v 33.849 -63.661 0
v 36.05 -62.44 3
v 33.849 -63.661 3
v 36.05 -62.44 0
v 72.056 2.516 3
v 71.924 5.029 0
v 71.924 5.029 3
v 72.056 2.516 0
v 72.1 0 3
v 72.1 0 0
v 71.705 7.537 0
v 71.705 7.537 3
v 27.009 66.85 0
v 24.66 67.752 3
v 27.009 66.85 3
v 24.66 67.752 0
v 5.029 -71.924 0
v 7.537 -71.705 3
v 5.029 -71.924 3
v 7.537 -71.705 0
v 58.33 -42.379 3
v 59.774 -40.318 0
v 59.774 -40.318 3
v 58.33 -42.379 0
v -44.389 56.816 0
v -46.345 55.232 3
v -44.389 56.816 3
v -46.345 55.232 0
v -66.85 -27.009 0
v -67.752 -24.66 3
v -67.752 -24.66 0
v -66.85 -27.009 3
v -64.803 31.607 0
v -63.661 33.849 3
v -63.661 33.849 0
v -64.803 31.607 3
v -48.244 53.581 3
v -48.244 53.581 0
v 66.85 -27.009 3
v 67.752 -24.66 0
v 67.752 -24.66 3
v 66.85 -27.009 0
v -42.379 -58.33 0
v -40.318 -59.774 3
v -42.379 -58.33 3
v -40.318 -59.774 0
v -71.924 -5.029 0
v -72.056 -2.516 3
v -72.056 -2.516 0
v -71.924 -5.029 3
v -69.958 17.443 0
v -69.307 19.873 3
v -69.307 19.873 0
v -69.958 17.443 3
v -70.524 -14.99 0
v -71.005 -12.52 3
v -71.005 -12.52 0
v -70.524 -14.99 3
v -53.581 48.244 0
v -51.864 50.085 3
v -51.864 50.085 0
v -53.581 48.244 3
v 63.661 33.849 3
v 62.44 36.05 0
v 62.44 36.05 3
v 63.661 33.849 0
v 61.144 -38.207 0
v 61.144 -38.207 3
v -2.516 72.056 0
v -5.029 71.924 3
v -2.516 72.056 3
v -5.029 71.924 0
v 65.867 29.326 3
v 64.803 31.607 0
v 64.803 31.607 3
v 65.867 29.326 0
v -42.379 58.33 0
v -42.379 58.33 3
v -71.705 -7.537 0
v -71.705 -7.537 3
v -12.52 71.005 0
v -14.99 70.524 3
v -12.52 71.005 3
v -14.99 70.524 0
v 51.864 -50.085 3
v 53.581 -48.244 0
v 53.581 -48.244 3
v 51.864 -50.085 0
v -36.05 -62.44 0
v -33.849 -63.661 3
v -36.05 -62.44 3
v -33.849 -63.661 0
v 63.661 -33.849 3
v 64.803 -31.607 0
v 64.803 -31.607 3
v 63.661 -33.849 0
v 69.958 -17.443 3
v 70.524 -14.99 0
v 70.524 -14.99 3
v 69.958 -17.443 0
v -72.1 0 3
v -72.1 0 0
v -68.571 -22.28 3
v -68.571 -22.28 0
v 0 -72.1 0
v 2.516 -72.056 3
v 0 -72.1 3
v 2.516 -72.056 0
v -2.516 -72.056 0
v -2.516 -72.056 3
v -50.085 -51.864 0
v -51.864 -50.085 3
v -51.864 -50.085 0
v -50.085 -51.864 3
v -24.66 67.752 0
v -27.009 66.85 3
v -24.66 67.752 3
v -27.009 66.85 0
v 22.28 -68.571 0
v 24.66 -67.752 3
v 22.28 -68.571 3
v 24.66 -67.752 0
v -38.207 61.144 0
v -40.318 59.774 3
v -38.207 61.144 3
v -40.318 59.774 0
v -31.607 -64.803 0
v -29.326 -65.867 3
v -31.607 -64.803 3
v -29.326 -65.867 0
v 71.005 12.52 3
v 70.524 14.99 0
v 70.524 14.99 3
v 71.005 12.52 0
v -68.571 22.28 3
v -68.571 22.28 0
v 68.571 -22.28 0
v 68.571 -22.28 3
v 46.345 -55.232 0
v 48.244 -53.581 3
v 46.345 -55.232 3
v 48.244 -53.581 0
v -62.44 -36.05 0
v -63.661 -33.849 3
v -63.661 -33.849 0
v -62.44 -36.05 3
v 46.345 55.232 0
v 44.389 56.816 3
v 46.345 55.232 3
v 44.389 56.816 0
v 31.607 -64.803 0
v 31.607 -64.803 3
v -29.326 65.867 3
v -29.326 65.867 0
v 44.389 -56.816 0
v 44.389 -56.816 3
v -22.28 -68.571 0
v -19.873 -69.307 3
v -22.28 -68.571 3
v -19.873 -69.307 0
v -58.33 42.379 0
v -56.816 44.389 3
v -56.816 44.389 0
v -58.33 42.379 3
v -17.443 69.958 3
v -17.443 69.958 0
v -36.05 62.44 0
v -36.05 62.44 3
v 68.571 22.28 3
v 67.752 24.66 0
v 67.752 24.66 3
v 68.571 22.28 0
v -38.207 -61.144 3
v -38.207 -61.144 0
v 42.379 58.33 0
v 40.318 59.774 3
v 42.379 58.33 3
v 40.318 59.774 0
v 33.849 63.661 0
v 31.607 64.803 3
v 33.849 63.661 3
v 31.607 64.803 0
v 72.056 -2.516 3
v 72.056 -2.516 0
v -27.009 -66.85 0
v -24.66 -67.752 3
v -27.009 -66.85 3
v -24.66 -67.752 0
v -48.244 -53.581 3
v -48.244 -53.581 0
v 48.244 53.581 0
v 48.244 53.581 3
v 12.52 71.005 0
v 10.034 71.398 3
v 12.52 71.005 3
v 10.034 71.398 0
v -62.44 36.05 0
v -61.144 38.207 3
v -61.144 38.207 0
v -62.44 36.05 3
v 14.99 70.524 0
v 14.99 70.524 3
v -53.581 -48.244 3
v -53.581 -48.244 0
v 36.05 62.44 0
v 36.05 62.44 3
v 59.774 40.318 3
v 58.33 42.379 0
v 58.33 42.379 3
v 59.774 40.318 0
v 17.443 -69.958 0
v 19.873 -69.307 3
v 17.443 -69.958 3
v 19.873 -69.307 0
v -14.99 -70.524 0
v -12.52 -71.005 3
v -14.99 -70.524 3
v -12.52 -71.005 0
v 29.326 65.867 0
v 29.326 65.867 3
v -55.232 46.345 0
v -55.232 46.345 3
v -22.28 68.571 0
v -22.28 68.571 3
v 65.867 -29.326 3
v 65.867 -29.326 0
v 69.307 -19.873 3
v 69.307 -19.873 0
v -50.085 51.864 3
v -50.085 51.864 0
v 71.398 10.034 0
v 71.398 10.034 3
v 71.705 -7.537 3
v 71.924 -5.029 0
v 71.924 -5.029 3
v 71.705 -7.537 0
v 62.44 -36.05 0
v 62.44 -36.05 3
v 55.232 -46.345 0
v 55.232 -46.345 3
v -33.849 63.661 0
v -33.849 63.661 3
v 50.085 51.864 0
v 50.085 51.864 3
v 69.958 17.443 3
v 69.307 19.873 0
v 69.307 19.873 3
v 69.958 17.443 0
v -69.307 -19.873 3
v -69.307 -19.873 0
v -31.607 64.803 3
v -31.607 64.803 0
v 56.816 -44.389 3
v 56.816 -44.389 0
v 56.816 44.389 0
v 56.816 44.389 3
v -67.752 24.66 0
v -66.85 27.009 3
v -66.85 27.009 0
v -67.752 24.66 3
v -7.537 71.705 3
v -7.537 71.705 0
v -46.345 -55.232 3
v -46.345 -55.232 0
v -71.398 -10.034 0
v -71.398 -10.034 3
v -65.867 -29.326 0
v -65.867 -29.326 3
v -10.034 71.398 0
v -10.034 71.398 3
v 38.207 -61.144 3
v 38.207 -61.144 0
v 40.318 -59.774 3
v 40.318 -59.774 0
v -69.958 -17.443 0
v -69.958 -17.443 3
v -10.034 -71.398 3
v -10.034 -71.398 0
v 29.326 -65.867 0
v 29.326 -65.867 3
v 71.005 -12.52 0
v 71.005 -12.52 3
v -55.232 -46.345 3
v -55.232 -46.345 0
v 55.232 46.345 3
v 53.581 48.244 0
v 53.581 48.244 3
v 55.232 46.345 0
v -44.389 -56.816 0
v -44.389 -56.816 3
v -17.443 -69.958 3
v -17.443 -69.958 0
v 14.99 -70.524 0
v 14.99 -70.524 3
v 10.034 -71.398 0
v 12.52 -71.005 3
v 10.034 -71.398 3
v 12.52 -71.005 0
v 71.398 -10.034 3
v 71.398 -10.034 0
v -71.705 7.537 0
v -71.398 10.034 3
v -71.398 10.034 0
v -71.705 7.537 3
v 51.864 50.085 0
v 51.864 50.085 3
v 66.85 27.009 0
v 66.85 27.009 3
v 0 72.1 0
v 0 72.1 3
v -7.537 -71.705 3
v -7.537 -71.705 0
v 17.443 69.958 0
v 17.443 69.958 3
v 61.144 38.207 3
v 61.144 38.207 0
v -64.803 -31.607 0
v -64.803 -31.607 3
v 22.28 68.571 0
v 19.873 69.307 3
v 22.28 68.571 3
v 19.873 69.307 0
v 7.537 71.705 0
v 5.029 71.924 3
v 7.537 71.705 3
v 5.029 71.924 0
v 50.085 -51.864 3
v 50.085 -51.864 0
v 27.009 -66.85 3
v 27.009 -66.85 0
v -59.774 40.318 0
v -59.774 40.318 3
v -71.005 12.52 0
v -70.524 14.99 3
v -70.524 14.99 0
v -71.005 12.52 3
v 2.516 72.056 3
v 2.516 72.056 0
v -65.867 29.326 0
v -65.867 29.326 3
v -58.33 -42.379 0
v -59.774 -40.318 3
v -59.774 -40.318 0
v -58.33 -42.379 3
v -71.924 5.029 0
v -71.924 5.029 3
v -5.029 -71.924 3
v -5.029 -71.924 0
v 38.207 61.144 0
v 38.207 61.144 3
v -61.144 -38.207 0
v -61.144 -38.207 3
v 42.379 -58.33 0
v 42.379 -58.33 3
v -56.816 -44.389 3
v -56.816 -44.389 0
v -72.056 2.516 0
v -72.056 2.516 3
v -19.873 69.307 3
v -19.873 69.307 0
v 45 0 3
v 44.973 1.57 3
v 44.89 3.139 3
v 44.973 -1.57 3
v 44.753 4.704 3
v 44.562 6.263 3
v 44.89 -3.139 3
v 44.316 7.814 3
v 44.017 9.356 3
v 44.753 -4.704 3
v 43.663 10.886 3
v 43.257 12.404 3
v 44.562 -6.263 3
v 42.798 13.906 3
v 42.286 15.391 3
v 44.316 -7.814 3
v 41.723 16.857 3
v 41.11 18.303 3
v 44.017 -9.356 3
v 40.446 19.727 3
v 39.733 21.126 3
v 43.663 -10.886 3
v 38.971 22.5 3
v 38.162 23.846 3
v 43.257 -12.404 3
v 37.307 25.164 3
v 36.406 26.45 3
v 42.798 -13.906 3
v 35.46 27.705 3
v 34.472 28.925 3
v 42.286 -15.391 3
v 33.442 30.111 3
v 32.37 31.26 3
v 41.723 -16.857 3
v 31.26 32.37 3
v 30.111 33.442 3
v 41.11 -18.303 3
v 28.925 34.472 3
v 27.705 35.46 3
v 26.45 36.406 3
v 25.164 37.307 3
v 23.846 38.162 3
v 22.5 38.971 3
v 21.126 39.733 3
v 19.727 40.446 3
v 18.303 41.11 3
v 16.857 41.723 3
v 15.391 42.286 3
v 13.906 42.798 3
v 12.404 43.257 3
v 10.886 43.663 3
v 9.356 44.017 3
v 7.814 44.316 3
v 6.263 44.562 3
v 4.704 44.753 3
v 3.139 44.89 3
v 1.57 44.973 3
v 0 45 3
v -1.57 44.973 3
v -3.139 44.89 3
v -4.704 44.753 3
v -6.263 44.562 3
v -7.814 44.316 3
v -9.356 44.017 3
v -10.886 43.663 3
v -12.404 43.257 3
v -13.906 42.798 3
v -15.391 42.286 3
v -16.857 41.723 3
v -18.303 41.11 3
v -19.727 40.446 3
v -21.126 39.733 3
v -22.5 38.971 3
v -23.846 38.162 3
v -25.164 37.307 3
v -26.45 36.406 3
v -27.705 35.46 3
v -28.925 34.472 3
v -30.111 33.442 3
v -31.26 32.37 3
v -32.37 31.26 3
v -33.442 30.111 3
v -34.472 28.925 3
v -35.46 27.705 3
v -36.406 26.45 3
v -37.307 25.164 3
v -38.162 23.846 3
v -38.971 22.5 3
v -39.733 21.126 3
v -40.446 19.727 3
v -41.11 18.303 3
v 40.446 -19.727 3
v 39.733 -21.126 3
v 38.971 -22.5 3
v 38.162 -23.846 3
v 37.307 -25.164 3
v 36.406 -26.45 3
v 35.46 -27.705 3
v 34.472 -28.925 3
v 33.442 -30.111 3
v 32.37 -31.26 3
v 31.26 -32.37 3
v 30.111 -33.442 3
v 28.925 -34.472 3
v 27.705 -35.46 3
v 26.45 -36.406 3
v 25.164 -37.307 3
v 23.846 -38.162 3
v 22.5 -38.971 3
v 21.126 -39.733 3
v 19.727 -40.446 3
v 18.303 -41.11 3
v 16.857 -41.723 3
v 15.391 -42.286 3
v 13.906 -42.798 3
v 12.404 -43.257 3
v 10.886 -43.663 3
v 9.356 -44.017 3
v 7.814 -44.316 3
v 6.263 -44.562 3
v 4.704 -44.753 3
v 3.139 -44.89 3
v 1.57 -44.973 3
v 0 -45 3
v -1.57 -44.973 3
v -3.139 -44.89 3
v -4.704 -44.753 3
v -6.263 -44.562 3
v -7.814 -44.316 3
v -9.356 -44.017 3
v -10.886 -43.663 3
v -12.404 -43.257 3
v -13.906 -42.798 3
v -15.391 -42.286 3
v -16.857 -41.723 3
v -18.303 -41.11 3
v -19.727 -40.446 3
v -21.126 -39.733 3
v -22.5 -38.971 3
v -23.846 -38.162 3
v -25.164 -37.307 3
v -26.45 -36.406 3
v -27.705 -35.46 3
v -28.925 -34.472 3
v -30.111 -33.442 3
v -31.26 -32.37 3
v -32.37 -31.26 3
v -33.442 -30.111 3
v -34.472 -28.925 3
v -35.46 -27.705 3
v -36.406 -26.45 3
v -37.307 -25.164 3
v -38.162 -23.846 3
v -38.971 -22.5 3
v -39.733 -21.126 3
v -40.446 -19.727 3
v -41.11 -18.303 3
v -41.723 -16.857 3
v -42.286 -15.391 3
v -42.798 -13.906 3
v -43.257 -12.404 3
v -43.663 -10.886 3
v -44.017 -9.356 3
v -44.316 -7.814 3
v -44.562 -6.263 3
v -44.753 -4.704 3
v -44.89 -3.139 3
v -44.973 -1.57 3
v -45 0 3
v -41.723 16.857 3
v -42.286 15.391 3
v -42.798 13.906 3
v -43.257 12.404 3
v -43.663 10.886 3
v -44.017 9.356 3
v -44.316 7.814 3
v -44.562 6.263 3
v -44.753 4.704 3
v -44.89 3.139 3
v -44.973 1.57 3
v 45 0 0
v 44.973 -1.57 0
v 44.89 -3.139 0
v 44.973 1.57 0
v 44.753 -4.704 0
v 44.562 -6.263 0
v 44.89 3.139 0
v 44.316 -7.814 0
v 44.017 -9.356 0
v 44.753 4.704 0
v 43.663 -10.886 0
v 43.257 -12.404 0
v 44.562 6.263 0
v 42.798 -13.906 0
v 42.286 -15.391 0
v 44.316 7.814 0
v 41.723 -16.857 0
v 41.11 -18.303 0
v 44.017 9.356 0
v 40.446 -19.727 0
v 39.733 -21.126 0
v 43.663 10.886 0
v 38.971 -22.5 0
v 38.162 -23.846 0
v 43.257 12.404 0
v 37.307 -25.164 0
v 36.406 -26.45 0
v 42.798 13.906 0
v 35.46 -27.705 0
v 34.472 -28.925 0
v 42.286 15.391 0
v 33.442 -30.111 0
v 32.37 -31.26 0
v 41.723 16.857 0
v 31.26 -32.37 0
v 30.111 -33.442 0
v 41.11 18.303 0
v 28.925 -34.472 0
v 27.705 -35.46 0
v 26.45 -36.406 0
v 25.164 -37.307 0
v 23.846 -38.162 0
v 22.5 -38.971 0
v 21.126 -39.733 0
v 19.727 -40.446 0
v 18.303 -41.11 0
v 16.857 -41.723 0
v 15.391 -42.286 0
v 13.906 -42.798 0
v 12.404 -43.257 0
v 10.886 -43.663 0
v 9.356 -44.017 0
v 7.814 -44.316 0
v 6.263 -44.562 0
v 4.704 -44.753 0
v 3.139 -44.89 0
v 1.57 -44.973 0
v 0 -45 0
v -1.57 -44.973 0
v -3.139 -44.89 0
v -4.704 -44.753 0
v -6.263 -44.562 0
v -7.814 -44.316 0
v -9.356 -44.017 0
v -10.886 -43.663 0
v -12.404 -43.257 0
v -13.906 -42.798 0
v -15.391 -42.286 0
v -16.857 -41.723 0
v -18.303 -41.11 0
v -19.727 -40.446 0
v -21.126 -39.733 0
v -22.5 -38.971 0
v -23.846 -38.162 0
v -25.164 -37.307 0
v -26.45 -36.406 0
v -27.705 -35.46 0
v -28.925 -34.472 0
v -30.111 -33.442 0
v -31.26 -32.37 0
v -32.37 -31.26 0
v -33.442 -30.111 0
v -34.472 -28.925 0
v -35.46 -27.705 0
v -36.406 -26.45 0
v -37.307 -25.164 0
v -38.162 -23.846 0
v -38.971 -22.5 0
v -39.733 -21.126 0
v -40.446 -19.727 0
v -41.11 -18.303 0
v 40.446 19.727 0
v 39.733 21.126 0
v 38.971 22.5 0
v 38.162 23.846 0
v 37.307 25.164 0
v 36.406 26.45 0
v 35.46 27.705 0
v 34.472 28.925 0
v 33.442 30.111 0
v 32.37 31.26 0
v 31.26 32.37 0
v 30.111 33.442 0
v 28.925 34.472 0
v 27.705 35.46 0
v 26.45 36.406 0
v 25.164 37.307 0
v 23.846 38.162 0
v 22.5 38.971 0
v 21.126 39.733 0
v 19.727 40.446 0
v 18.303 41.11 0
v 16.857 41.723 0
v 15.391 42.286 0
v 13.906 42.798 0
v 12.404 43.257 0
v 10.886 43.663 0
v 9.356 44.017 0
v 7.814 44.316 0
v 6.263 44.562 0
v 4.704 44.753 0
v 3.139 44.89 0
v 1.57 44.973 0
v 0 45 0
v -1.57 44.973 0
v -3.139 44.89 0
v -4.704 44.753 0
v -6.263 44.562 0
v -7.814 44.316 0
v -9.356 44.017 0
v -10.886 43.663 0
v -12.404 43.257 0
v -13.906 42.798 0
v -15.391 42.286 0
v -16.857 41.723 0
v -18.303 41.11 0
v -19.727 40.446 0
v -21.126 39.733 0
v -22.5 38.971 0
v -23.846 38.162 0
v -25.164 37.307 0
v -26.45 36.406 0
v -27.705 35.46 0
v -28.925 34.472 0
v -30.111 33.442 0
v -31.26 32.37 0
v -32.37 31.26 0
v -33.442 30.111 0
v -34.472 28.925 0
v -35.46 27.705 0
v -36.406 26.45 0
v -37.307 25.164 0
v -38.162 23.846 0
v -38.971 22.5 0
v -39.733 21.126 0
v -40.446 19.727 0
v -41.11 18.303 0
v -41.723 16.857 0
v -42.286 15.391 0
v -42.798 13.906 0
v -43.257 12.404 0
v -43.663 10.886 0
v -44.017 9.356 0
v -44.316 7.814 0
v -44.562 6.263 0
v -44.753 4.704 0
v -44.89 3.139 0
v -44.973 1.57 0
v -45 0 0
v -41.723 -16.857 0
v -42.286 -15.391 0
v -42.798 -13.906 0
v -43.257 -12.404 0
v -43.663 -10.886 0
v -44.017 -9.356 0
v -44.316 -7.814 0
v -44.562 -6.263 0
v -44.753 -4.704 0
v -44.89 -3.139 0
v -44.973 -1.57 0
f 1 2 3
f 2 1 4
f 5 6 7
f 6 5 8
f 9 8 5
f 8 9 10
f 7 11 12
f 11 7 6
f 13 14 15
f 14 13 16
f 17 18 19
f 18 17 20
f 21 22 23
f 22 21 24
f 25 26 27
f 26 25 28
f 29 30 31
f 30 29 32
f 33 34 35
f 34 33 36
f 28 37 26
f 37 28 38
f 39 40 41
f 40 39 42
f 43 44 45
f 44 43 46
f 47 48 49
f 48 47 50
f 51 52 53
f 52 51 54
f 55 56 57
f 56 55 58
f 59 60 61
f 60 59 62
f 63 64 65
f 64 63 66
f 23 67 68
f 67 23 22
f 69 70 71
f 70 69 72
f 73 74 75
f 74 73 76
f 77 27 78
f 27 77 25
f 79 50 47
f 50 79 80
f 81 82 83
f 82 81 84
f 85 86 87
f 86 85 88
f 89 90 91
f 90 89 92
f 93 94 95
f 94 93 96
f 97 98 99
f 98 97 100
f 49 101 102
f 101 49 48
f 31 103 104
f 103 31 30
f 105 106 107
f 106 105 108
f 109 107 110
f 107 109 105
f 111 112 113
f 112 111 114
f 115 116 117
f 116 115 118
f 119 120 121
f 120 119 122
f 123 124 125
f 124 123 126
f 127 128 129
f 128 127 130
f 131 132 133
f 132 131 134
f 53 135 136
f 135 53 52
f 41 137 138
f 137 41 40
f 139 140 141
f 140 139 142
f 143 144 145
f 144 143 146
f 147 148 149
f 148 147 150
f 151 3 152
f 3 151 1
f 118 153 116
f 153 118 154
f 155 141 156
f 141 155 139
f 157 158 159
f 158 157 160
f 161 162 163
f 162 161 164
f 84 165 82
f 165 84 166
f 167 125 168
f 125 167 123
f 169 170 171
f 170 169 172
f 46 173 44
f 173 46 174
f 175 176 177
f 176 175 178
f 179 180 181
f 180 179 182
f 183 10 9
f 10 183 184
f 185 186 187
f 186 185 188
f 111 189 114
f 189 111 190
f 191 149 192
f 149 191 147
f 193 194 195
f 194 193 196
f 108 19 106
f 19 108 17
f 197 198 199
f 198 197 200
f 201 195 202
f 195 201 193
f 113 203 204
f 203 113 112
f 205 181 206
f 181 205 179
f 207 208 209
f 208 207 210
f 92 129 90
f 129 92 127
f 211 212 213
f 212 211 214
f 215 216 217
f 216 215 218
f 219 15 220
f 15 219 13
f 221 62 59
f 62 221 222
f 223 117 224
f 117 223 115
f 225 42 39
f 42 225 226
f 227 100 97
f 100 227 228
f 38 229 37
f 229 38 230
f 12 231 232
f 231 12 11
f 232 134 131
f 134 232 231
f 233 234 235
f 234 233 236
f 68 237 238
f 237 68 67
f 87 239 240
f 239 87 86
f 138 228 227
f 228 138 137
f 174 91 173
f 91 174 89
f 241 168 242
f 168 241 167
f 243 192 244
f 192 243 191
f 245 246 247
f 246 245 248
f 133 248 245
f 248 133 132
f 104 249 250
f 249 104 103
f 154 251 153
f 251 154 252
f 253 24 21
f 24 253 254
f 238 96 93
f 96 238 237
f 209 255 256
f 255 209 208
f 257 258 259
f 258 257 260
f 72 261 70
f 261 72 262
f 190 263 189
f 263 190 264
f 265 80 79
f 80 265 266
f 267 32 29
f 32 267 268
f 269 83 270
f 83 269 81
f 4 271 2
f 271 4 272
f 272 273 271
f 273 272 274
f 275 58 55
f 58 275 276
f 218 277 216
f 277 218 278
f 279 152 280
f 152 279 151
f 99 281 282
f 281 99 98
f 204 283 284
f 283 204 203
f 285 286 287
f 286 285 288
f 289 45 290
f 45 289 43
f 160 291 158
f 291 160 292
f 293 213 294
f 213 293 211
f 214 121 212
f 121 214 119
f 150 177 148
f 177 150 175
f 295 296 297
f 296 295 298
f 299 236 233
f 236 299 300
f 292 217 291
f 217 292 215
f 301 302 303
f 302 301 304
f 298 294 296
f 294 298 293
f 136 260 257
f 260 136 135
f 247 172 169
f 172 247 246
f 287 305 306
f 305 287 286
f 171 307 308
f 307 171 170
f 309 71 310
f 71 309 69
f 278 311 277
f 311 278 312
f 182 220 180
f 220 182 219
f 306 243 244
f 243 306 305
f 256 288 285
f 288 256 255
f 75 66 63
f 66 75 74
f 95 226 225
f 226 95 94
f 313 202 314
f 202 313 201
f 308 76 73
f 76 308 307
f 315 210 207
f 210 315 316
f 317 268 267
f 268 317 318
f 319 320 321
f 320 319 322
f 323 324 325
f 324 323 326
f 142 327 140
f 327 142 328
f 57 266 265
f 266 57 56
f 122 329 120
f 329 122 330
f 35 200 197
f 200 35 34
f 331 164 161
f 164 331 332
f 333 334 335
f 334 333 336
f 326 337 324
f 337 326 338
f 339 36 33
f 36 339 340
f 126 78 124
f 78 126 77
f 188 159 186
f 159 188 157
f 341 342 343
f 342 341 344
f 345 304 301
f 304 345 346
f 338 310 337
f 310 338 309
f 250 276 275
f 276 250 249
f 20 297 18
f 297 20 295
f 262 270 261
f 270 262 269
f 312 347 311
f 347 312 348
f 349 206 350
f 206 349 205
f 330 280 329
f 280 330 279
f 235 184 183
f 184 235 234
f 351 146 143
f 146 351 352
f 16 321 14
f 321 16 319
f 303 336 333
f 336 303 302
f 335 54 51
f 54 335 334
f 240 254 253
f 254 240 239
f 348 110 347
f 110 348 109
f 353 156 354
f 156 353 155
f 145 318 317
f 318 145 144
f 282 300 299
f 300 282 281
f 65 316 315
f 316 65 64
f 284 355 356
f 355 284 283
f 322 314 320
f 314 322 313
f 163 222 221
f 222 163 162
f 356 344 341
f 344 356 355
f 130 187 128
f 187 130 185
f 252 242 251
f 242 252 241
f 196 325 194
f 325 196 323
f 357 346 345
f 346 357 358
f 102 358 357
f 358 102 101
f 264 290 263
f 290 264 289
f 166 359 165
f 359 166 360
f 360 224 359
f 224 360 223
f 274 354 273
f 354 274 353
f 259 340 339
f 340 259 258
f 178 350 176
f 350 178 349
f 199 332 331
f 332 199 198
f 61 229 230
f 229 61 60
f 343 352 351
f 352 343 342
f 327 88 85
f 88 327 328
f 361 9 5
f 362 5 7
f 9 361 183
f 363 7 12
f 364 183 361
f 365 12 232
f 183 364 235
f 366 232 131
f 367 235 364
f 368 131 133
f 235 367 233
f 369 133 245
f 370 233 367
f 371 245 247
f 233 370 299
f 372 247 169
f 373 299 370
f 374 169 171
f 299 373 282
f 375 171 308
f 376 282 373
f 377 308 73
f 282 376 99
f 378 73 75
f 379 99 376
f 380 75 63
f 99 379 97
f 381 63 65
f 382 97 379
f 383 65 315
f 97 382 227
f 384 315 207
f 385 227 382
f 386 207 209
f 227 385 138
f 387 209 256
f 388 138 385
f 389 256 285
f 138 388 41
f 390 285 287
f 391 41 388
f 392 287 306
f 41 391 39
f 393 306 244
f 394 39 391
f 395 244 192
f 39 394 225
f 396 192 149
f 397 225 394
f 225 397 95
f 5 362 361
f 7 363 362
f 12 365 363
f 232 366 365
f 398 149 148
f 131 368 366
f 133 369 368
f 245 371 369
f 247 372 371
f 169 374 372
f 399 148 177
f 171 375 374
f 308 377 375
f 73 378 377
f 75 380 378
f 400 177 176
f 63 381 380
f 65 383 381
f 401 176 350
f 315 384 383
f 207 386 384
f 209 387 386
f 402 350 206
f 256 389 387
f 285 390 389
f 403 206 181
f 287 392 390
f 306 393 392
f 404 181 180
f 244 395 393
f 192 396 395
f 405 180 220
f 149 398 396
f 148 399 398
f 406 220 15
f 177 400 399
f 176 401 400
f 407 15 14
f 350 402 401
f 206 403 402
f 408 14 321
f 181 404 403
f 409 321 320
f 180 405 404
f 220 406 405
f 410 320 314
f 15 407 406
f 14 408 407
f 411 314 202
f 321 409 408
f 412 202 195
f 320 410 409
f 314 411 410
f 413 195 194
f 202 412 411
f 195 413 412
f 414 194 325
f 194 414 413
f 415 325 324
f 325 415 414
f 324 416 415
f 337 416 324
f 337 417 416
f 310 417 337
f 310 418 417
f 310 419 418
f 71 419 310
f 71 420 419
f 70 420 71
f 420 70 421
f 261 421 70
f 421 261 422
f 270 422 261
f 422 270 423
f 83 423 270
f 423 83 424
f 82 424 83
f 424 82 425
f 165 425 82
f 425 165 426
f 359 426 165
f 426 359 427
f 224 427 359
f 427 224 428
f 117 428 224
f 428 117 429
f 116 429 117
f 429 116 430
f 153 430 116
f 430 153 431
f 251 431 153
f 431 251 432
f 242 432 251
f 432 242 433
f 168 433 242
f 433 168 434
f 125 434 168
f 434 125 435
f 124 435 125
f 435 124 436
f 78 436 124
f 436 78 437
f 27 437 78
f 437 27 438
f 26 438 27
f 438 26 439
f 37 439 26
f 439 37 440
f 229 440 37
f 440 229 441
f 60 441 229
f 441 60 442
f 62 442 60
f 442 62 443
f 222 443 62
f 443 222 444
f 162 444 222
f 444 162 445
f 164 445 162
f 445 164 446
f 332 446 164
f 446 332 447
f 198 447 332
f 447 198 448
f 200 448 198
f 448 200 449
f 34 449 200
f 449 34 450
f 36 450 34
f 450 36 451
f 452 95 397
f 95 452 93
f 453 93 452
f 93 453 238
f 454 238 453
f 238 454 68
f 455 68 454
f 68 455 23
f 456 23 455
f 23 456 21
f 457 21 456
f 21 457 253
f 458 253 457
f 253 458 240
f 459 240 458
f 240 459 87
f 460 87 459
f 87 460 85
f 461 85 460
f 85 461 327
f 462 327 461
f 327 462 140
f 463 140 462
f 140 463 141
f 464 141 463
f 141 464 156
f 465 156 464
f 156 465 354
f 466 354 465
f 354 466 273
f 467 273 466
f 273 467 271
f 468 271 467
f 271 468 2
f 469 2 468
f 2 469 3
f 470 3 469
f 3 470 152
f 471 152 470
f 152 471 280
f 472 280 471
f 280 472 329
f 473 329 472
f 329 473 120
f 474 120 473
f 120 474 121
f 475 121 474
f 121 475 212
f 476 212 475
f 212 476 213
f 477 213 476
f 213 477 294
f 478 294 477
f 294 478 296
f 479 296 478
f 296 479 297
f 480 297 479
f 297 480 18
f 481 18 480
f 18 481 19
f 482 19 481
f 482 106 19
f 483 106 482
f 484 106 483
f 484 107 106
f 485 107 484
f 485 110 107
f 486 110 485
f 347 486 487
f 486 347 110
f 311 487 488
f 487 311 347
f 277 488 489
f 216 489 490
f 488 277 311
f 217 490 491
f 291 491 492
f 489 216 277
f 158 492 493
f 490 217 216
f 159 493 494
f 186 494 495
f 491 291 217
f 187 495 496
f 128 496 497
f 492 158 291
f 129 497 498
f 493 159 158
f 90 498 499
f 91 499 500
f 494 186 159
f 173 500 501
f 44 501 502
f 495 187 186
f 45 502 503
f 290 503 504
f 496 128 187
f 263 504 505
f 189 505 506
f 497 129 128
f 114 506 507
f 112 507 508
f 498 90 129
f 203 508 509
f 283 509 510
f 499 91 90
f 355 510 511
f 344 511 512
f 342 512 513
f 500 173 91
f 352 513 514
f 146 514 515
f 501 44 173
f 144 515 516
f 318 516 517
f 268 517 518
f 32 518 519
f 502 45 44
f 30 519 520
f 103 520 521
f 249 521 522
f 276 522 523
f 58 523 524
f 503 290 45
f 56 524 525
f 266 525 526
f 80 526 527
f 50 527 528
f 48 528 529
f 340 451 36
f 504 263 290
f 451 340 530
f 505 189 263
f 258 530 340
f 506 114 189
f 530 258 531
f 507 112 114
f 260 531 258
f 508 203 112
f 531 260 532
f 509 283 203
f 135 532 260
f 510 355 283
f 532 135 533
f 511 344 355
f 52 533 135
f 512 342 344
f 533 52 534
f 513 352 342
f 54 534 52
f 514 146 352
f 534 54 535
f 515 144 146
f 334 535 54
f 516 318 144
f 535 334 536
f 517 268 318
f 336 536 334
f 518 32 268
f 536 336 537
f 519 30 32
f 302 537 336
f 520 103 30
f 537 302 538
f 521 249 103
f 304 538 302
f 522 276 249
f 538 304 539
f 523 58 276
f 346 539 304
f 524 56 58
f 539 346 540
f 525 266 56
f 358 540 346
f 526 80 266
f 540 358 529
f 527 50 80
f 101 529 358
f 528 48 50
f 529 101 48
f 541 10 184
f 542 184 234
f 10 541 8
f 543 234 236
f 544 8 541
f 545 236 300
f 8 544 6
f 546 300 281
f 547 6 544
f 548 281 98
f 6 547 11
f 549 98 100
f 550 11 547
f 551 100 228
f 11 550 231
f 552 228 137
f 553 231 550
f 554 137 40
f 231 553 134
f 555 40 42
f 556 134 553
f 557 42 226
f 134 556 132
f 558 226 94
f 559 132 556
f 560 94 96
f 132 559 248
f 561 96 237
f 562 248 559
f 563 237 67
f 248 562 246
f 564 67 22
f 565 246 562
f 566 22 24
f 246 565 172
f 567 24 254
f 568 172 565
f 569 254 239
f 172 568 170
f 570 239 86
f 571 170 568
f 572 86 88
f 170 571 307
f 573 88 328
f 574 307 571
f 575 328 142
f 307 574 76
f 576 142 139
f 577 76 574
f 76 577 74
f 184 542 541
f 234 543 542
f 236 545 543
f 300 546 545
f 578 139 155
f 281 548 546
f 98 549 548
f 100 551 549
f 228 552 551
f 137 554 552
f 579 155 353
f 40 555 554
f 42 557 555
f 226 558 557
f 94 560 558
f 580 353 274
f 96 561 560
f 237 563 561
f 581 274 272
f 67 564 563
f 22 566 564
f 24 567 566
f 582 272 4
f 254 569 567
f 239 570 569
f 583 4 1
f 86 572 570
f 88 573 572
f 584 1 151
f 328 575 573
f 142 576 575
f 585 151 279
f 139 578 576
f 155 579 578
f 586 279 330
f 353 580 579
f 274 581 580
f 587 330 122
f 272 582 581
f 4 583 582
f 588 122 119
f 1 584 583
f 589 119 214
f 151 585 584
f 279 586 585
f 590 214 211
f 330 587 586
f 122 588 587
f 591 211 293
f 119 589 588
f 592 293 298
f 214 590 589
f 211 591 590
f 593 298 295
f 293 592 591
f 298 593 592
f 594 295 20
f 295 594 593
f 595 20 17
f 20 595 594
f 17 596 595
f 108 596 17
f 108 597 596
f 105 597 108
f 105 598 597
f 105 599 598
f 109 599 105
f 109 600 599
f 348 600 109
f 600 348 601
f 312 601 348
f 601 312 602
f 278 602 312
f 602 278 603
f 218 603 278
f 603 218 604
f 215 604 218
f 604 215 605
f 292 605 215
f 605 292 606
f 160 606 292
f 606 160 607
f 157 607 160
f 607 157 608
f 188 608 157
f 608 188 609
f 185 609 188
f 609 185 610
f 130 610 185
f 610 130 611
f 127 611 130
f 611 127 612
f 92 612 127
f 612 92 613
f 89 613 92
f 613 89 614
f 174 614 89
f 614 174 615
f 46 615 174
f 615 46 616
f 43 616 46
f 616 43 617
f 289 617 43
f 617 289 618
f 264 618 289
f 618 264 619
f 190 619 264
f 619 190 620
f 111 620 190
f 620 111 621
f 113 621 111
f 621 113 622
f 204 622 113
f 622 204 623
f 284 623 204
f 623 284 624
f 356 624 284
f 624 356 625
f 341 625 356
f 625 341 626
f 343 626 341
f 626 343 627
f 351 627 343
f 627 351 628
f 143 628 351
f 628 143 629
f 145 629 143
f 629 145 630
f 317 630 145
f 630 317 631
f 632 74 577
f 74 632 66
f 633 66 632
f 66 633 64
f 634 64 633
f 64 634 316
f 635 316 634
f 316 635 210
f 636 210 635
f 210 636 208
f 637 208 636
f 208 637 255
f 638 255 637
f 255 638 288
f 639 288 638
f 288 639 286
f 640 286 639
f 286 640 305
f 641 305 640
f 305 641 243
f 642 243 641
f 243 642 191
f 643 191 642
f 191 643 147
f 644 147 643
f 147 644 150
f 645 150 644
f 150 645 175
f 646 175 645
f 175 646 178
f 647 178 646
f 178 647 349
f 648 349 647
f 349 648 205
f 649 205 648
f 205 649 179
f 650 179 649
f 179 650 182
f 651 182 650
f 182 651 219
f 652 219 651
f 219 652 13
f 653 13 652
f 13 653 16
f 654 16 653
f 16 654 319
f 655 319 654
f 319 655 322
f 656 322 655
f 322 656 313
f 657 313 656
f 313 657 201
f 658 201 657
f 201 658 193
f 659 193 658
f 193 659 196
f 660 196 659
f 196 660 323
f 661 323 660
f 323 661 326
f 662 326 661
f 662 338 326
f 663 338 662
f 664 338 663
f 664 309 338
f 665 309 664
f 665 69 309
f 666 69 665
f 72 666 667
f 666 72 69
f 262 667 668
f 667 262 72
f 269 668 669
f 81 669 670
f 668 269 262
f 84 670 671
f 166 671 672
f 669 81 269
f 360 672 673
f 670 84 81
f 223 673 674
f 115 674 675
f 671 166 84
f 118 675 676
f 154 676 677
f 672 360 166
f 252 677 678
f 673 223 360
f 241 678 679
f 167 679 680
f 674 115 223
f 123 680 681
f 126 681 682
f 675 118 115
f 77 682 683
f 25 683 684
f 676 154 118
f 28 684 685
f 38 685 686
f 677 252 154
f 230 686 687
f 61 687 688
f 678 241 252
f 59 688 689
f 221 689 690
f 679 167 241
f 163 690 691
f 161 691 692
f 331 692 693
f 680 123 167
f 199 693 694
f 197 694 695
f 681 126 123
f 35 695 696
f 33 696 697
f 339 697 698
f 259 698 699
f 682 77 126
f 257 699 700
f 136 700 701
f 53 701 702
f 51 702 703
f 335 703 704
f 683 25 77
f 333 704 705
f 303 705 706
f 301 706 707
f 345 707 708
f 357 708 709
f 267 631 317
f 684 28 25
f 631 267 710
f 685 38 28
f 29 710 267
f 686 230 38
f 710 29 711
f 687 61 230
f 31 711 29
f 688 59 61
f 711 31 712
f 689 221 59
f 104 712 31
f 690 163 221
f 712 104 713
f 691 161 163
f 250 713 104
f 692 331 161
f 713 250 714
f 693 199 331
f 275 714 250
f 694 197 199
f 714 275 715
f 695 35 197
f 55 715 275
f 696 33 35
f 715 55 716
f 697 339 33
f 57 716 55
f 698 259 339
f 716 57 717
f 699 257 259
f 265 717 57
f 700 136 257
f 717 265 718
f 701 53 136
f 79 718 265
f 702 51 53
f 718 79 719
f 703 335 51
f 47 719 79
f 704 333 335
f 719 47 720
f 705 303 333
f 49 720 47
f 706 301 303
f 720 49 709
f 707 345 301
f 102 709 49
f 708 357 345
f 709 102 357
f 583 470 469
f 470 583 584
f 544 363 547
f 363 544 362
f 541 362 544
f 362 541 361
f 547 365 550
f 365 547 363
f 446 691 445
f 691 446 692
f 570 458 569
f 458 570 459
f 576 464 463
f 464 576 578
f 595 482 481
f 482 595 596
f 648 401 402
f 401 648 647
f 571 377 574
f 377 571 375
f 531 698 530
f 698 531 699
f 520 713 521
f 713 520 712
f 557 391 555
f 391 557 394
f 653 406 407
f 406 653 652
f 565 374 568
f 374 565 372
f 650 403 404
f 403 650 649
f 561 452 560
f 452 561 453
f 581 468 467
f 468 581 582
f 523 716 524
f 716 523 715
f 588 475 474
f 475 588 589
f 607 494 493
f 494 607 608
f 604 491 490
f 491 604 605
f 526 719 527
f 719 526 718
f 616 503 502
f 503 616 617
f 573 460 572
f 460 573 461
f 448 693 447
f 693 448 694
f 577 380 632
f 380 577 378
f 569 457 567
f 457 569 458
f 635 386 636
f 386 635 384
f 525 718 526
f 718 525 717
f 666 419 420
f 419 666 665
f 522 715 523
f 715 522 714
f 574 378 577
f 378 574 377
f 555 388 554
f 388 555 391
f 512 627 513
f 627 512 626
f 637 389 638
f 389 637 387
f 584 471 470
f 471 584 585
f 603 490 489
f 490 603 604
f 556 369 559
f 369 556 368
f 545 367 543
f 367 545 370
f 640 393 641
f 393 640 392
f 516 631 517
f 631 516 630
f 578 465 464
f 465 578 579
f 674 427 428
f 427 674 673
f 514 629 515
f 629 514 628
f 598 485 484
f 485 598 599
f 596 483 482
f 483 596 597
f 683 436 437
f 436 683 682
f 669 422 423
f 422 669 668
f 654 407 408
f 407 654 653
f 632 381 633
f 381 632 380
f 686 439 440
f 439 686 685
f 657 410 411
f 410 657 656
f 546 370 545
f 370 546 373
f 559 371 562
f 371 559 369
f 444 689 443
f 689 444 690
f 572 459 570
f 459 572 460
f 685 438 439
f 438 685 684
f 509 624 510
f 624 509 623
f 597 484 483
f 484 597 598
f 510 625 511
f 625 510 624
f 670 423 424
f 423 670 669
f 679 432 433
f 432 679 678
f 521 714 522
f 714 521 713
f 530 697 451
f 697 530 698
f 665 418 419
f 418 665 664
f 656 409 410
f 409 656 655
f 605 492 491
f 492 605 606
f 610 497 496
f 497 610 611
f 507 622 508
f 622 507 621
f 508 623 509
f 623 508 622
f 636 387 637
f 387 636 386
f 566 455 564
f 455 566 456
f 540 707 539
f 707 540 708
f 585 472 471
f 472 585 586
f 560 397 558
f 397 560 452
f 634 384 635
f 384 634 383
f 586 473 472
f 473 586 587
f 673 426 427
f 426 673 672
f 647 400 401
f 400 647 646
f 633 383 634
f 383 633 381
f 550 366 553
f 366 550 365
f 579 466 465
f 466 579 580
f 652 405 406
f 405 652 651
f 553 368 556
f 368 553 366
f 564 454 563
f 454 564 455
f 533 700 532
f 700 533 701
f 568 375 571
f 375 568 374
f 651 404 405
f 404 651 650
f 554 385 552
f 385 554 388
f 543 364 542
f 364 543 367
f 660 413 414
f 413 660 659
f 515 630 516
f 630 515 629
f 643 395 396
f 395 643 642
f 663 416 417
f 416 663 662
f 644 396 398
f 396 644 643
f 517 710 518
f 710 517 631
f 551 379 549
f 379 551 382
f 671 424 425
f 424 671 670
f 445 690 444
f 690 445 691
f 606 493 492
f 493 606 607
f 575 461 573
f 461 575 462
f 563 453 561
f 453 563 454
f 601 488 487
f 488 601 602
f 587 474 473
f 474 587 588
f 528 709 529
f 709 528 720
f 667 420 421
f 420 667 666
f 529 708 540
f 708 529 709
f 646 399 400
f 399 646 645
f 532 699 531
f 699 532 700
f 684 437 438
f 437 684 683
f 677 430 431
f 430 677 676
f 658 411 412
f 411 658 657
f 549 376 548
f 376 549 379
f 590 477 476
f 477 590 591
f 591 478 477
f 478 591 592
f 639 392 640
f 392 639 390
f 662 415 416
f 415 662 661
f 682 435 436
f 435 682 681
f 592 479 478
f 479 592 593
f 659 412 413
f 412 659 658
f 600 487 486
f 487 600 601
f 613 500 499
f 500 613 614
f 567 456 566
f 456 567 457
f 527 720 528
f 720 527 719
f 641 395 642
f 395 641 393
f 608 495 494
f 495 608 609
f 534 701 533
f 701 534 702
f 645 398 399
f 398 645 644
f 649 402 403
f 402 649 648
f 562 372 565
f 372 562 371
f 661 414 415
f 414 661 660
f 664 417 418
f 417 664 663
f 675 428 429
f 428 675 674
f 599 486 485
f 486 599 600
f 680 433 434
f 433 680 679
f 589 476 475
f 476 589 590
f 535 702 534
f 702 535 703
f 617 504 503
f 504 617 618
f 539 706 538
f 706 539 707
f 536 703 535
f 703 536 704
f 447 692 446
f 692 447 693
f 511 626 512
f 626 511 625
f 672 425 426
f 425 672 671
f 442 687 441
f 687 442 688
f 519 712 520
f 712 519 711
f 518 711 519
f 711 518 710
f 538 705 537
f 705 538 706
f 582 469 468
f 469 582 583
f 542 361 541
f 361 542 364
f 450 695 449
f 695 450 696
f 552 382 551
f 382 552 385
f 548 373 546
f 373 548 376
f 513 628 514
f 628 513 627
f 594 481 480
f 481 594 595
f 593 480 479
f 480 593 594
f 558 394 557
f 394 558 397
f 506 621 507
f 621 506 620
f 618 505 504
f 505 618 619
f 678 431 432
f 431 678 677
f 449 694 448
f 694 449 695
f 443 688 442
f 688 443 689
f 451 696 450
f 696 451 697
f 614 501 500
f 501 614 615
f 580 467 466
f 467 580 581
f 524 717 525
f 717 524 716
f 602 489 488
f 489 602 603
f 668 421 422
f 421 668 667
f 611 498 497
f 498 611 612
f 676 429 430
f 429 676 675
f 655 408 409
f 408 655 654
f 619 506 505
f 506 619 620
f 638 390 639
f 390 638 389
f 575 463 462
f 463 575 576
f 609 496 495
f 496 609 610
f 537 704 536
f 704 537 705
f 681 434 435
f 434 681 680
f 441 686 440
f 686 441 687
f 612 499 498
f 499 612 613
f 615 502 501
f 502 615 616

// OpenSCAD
$fn = 180;

difference() {
    cylinder(d = 144.2,h = 3);
    translate([0, 0, -1]) cylinder(d = 90,h = 5);
}
